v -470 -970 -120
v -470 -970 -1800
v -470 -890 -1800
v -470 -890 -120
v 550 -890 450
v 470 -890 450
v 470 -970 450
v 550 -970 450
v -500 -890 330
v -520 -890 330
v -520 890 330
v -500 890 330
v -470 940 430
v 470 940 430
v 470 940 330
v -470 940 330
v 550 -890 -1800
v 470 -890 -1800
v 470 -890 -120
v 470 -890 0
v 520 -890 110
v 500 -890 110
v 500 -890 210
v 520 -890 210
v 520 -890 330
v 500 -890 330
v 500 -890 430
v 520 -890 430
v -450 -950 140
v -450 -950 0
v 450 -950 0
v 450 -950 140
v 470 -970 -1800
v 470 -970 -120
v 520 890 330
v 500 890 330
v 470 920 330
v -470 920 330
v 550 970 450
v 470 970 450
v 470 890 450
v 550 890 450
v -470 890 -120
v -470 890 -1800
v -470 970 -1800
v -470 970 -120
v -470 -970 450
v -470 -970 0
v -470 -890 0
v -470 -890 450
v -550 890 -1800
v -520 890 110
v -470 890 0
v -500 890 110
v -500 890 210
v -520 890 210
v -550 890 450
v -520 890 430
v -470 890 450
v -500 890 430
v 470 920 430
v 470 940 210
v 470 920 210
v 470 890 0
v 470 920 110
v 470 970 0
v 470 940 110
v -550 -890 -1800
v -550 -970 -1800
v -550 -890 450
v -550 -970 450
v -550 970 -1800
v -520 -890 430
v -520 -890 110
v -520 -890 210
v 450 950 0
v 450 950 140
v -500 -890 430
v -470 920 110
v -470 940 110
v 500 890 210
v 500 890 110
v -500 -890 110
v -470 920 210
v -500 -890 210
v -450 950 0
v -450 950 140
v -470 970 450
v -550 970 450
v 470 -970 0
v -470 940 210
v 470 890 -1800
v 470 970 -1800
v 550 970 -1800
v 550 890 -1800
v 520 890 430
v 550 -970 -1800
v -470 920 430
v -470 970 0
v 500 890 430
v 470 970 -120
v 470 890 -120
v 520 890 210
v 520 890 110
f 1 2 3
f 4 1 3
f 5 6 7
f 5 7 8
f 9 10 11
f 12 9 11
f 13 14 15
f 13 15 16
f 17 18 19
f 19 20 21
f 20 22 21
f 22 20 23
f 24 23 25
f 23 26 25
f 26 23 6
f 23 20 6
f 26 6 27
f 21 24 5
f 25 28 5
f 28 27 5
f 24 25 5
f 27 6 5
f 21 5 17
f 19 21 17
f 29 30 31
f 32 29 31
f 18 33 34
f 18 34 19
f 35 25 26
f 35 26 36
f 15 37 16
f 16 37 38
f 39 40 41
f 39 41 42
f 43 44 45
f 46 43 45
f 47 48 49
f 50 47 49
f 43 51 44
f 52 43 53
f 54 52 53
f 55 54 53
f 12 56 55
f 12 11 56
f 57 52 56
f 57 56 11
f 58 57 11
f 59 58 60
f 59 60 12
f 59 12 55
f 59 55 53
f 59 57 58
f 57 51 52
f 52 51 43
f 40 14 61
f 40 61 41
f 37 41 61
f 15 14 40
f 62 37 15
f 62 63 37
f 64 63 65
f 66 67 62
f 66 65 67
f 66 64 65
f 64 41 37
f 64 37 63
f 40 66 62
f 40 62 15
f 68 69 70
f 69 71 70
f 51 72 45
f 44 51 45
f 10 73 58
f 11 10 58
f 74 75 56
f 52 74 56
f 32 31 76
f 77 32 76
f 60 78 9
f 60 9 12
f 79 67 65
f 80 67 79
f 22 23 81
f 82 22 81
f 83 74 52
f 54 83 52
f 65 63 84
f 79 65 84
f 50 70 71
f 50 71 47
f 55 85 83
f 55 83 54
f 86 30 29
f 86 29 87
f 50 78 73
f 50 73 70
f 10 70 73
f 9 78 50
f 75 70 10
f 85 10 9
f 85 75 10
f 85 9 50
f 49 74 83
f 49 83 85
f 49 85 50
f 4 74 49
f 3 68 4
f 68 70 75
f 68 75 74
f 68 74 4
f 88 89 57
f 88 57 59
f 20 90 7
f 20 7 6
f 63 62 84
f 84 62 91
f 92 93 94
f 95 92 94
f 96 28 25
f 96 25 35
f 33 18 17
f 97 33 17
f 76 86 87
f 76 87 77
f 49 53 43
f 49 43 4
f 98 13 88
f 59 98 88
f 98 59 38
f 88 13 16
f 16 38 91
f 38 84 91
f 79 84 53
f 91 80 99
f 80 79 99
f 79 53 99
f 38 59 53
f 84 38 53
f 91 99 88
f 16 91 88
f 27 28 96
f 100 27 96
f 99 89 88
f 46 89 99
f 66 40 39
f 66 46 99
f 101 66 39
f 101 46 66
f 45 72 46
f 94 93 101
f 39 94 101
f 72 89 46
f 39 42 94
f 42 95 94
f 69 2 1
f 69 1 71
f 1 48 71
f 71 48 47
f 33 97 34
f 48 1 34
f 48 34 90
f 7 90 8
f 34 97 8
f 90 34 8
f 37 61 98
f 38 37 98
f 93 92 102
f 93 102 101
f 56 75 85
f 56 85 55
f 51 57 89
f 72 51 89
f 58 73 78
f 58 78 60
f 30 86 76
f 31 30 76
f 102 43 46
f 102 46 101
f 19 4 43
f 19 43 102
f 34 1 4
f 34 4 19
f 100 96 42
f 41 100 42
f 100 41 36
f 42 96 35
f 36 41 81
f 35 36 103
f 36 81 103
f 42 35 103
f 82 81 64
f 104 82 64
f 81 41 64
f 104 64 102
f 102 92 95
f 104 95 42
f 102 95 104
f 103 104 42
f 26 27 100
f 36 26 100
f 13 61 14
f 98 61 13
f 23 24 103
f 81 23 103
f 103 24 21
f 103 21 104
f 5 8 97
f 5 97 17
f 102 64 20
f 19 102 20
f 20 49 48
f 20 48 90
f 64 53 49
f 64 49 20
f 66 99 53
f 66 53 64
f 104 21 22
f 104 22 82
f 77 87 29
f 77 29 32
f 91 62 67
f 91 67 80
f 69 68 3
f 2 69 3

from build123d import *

# Parameters (mm, degrees)
F0_W      = 900
F0_H      = 1900
F1_DEPTH  = 140
F2_W      = 940
F2_H      = 1940
F3_DEPTH  = 120
F4_W      = 80
F4_H      = 80
F5_DEPTH  = 1800
F6_DEPTH  = 450
F8_W      = 1940
F8_H      = 100
F9_DEPTH  = 10
F12_W     = 1040
F12_H     = 100
F13_DEPTH = 10


with BuildPart() as f1:
    # F0 (on Top) → F1 (new body)
    with BuildSketch(Plane.XY):
        Rectangle(F0_W, F0_H)
    extrude(amount=F1_DEPTH)


with BuildPart() as f3:
    # F2 (on face) → F3 (new body)
    with BuildSketch(Plane(origin=(0, 0, 0), x_dir=(1, 0, 0), z_dir=(0, 0, -1))):
        Rectangle(F2_W, F2_H)
    extrude(amount=F3_DEPTH)

    # F4 (on face) → F5 (join)
    with BuildSketch(Plane.XY):
        with Locations((510, 930)):
            Rectangle(F4_W, F4_H)
        with Locations((510, -930)):
            Rectangle(F4_W, F4_H)
        with Locations((-510, 930)):
            Rectangle(F4_W, F4_H)
        with Locations((-510, -930)):
            Rectangle(F4_W, F4_H)
    extrude(amount=-F5_DEPTH)

    # F4 (on face) → F6 (join)
    with BuildSketch(Plane.XY):
        with Locations((510, 930)):
            Rectangle(F4_W, F4_H)
        with Locations((510, -930)):
            Rectangle(F4_W, F4_H)
        with Locations((-510, 930)):
            Rectangle(F4_W, F4_H)
        with Locations((-510, -930)):
            Rectangle(F4_W, F4_H)
    extrude(amount=F6_DEPTH)

    # F10: F9b, F9 across plane


with BuildPart() as f9:
    # F8 (on mid) → F9 (new body, symmetric)
    with BuildSketch(Plane.YZ.offset(510)):
        with Locations((0, 380)):
            Rectangle(F8_W, F8_H)
    extrude(amount=F9_DEPTH, both=True)


with BuildPart() as f9b:
    # F8 (on mid) → F9, piece 2 (new body, symmetric)
    with BuildSketch(Plane.YZ.offset(510)):
        with Locations((0, 160)):
            Rectangle(F8_W, F8_H)
    extrude(amount=F9_DEPTH, both=True)


with BuildPart() as f3_1:
    add(f3.part)
    add(f9b.part.mirror(Plane.YZ))
    add(f9.part.mirror(Plane.YZ))


    add(f9.part)  # F13 merges F9

    add(f9b.part)  # F13 merges F9b
    # F12 (on mid) → F13 (join, symmetric)
    with BuildSketch(Plane(origin=(0, 930, 0), x_dir=(-1, 0, 0), z_dir=(0, 1, 0))):
        with Locations((0, 380)):
            Rectangle(F12_W, F12_H)
        with Locations((0, 160)):
            Rectangle(F12_W, F12_H)
    extrude(amount=F13_DEPTH, both=True)


solid = Compound([f1.part, f3_1.part])
